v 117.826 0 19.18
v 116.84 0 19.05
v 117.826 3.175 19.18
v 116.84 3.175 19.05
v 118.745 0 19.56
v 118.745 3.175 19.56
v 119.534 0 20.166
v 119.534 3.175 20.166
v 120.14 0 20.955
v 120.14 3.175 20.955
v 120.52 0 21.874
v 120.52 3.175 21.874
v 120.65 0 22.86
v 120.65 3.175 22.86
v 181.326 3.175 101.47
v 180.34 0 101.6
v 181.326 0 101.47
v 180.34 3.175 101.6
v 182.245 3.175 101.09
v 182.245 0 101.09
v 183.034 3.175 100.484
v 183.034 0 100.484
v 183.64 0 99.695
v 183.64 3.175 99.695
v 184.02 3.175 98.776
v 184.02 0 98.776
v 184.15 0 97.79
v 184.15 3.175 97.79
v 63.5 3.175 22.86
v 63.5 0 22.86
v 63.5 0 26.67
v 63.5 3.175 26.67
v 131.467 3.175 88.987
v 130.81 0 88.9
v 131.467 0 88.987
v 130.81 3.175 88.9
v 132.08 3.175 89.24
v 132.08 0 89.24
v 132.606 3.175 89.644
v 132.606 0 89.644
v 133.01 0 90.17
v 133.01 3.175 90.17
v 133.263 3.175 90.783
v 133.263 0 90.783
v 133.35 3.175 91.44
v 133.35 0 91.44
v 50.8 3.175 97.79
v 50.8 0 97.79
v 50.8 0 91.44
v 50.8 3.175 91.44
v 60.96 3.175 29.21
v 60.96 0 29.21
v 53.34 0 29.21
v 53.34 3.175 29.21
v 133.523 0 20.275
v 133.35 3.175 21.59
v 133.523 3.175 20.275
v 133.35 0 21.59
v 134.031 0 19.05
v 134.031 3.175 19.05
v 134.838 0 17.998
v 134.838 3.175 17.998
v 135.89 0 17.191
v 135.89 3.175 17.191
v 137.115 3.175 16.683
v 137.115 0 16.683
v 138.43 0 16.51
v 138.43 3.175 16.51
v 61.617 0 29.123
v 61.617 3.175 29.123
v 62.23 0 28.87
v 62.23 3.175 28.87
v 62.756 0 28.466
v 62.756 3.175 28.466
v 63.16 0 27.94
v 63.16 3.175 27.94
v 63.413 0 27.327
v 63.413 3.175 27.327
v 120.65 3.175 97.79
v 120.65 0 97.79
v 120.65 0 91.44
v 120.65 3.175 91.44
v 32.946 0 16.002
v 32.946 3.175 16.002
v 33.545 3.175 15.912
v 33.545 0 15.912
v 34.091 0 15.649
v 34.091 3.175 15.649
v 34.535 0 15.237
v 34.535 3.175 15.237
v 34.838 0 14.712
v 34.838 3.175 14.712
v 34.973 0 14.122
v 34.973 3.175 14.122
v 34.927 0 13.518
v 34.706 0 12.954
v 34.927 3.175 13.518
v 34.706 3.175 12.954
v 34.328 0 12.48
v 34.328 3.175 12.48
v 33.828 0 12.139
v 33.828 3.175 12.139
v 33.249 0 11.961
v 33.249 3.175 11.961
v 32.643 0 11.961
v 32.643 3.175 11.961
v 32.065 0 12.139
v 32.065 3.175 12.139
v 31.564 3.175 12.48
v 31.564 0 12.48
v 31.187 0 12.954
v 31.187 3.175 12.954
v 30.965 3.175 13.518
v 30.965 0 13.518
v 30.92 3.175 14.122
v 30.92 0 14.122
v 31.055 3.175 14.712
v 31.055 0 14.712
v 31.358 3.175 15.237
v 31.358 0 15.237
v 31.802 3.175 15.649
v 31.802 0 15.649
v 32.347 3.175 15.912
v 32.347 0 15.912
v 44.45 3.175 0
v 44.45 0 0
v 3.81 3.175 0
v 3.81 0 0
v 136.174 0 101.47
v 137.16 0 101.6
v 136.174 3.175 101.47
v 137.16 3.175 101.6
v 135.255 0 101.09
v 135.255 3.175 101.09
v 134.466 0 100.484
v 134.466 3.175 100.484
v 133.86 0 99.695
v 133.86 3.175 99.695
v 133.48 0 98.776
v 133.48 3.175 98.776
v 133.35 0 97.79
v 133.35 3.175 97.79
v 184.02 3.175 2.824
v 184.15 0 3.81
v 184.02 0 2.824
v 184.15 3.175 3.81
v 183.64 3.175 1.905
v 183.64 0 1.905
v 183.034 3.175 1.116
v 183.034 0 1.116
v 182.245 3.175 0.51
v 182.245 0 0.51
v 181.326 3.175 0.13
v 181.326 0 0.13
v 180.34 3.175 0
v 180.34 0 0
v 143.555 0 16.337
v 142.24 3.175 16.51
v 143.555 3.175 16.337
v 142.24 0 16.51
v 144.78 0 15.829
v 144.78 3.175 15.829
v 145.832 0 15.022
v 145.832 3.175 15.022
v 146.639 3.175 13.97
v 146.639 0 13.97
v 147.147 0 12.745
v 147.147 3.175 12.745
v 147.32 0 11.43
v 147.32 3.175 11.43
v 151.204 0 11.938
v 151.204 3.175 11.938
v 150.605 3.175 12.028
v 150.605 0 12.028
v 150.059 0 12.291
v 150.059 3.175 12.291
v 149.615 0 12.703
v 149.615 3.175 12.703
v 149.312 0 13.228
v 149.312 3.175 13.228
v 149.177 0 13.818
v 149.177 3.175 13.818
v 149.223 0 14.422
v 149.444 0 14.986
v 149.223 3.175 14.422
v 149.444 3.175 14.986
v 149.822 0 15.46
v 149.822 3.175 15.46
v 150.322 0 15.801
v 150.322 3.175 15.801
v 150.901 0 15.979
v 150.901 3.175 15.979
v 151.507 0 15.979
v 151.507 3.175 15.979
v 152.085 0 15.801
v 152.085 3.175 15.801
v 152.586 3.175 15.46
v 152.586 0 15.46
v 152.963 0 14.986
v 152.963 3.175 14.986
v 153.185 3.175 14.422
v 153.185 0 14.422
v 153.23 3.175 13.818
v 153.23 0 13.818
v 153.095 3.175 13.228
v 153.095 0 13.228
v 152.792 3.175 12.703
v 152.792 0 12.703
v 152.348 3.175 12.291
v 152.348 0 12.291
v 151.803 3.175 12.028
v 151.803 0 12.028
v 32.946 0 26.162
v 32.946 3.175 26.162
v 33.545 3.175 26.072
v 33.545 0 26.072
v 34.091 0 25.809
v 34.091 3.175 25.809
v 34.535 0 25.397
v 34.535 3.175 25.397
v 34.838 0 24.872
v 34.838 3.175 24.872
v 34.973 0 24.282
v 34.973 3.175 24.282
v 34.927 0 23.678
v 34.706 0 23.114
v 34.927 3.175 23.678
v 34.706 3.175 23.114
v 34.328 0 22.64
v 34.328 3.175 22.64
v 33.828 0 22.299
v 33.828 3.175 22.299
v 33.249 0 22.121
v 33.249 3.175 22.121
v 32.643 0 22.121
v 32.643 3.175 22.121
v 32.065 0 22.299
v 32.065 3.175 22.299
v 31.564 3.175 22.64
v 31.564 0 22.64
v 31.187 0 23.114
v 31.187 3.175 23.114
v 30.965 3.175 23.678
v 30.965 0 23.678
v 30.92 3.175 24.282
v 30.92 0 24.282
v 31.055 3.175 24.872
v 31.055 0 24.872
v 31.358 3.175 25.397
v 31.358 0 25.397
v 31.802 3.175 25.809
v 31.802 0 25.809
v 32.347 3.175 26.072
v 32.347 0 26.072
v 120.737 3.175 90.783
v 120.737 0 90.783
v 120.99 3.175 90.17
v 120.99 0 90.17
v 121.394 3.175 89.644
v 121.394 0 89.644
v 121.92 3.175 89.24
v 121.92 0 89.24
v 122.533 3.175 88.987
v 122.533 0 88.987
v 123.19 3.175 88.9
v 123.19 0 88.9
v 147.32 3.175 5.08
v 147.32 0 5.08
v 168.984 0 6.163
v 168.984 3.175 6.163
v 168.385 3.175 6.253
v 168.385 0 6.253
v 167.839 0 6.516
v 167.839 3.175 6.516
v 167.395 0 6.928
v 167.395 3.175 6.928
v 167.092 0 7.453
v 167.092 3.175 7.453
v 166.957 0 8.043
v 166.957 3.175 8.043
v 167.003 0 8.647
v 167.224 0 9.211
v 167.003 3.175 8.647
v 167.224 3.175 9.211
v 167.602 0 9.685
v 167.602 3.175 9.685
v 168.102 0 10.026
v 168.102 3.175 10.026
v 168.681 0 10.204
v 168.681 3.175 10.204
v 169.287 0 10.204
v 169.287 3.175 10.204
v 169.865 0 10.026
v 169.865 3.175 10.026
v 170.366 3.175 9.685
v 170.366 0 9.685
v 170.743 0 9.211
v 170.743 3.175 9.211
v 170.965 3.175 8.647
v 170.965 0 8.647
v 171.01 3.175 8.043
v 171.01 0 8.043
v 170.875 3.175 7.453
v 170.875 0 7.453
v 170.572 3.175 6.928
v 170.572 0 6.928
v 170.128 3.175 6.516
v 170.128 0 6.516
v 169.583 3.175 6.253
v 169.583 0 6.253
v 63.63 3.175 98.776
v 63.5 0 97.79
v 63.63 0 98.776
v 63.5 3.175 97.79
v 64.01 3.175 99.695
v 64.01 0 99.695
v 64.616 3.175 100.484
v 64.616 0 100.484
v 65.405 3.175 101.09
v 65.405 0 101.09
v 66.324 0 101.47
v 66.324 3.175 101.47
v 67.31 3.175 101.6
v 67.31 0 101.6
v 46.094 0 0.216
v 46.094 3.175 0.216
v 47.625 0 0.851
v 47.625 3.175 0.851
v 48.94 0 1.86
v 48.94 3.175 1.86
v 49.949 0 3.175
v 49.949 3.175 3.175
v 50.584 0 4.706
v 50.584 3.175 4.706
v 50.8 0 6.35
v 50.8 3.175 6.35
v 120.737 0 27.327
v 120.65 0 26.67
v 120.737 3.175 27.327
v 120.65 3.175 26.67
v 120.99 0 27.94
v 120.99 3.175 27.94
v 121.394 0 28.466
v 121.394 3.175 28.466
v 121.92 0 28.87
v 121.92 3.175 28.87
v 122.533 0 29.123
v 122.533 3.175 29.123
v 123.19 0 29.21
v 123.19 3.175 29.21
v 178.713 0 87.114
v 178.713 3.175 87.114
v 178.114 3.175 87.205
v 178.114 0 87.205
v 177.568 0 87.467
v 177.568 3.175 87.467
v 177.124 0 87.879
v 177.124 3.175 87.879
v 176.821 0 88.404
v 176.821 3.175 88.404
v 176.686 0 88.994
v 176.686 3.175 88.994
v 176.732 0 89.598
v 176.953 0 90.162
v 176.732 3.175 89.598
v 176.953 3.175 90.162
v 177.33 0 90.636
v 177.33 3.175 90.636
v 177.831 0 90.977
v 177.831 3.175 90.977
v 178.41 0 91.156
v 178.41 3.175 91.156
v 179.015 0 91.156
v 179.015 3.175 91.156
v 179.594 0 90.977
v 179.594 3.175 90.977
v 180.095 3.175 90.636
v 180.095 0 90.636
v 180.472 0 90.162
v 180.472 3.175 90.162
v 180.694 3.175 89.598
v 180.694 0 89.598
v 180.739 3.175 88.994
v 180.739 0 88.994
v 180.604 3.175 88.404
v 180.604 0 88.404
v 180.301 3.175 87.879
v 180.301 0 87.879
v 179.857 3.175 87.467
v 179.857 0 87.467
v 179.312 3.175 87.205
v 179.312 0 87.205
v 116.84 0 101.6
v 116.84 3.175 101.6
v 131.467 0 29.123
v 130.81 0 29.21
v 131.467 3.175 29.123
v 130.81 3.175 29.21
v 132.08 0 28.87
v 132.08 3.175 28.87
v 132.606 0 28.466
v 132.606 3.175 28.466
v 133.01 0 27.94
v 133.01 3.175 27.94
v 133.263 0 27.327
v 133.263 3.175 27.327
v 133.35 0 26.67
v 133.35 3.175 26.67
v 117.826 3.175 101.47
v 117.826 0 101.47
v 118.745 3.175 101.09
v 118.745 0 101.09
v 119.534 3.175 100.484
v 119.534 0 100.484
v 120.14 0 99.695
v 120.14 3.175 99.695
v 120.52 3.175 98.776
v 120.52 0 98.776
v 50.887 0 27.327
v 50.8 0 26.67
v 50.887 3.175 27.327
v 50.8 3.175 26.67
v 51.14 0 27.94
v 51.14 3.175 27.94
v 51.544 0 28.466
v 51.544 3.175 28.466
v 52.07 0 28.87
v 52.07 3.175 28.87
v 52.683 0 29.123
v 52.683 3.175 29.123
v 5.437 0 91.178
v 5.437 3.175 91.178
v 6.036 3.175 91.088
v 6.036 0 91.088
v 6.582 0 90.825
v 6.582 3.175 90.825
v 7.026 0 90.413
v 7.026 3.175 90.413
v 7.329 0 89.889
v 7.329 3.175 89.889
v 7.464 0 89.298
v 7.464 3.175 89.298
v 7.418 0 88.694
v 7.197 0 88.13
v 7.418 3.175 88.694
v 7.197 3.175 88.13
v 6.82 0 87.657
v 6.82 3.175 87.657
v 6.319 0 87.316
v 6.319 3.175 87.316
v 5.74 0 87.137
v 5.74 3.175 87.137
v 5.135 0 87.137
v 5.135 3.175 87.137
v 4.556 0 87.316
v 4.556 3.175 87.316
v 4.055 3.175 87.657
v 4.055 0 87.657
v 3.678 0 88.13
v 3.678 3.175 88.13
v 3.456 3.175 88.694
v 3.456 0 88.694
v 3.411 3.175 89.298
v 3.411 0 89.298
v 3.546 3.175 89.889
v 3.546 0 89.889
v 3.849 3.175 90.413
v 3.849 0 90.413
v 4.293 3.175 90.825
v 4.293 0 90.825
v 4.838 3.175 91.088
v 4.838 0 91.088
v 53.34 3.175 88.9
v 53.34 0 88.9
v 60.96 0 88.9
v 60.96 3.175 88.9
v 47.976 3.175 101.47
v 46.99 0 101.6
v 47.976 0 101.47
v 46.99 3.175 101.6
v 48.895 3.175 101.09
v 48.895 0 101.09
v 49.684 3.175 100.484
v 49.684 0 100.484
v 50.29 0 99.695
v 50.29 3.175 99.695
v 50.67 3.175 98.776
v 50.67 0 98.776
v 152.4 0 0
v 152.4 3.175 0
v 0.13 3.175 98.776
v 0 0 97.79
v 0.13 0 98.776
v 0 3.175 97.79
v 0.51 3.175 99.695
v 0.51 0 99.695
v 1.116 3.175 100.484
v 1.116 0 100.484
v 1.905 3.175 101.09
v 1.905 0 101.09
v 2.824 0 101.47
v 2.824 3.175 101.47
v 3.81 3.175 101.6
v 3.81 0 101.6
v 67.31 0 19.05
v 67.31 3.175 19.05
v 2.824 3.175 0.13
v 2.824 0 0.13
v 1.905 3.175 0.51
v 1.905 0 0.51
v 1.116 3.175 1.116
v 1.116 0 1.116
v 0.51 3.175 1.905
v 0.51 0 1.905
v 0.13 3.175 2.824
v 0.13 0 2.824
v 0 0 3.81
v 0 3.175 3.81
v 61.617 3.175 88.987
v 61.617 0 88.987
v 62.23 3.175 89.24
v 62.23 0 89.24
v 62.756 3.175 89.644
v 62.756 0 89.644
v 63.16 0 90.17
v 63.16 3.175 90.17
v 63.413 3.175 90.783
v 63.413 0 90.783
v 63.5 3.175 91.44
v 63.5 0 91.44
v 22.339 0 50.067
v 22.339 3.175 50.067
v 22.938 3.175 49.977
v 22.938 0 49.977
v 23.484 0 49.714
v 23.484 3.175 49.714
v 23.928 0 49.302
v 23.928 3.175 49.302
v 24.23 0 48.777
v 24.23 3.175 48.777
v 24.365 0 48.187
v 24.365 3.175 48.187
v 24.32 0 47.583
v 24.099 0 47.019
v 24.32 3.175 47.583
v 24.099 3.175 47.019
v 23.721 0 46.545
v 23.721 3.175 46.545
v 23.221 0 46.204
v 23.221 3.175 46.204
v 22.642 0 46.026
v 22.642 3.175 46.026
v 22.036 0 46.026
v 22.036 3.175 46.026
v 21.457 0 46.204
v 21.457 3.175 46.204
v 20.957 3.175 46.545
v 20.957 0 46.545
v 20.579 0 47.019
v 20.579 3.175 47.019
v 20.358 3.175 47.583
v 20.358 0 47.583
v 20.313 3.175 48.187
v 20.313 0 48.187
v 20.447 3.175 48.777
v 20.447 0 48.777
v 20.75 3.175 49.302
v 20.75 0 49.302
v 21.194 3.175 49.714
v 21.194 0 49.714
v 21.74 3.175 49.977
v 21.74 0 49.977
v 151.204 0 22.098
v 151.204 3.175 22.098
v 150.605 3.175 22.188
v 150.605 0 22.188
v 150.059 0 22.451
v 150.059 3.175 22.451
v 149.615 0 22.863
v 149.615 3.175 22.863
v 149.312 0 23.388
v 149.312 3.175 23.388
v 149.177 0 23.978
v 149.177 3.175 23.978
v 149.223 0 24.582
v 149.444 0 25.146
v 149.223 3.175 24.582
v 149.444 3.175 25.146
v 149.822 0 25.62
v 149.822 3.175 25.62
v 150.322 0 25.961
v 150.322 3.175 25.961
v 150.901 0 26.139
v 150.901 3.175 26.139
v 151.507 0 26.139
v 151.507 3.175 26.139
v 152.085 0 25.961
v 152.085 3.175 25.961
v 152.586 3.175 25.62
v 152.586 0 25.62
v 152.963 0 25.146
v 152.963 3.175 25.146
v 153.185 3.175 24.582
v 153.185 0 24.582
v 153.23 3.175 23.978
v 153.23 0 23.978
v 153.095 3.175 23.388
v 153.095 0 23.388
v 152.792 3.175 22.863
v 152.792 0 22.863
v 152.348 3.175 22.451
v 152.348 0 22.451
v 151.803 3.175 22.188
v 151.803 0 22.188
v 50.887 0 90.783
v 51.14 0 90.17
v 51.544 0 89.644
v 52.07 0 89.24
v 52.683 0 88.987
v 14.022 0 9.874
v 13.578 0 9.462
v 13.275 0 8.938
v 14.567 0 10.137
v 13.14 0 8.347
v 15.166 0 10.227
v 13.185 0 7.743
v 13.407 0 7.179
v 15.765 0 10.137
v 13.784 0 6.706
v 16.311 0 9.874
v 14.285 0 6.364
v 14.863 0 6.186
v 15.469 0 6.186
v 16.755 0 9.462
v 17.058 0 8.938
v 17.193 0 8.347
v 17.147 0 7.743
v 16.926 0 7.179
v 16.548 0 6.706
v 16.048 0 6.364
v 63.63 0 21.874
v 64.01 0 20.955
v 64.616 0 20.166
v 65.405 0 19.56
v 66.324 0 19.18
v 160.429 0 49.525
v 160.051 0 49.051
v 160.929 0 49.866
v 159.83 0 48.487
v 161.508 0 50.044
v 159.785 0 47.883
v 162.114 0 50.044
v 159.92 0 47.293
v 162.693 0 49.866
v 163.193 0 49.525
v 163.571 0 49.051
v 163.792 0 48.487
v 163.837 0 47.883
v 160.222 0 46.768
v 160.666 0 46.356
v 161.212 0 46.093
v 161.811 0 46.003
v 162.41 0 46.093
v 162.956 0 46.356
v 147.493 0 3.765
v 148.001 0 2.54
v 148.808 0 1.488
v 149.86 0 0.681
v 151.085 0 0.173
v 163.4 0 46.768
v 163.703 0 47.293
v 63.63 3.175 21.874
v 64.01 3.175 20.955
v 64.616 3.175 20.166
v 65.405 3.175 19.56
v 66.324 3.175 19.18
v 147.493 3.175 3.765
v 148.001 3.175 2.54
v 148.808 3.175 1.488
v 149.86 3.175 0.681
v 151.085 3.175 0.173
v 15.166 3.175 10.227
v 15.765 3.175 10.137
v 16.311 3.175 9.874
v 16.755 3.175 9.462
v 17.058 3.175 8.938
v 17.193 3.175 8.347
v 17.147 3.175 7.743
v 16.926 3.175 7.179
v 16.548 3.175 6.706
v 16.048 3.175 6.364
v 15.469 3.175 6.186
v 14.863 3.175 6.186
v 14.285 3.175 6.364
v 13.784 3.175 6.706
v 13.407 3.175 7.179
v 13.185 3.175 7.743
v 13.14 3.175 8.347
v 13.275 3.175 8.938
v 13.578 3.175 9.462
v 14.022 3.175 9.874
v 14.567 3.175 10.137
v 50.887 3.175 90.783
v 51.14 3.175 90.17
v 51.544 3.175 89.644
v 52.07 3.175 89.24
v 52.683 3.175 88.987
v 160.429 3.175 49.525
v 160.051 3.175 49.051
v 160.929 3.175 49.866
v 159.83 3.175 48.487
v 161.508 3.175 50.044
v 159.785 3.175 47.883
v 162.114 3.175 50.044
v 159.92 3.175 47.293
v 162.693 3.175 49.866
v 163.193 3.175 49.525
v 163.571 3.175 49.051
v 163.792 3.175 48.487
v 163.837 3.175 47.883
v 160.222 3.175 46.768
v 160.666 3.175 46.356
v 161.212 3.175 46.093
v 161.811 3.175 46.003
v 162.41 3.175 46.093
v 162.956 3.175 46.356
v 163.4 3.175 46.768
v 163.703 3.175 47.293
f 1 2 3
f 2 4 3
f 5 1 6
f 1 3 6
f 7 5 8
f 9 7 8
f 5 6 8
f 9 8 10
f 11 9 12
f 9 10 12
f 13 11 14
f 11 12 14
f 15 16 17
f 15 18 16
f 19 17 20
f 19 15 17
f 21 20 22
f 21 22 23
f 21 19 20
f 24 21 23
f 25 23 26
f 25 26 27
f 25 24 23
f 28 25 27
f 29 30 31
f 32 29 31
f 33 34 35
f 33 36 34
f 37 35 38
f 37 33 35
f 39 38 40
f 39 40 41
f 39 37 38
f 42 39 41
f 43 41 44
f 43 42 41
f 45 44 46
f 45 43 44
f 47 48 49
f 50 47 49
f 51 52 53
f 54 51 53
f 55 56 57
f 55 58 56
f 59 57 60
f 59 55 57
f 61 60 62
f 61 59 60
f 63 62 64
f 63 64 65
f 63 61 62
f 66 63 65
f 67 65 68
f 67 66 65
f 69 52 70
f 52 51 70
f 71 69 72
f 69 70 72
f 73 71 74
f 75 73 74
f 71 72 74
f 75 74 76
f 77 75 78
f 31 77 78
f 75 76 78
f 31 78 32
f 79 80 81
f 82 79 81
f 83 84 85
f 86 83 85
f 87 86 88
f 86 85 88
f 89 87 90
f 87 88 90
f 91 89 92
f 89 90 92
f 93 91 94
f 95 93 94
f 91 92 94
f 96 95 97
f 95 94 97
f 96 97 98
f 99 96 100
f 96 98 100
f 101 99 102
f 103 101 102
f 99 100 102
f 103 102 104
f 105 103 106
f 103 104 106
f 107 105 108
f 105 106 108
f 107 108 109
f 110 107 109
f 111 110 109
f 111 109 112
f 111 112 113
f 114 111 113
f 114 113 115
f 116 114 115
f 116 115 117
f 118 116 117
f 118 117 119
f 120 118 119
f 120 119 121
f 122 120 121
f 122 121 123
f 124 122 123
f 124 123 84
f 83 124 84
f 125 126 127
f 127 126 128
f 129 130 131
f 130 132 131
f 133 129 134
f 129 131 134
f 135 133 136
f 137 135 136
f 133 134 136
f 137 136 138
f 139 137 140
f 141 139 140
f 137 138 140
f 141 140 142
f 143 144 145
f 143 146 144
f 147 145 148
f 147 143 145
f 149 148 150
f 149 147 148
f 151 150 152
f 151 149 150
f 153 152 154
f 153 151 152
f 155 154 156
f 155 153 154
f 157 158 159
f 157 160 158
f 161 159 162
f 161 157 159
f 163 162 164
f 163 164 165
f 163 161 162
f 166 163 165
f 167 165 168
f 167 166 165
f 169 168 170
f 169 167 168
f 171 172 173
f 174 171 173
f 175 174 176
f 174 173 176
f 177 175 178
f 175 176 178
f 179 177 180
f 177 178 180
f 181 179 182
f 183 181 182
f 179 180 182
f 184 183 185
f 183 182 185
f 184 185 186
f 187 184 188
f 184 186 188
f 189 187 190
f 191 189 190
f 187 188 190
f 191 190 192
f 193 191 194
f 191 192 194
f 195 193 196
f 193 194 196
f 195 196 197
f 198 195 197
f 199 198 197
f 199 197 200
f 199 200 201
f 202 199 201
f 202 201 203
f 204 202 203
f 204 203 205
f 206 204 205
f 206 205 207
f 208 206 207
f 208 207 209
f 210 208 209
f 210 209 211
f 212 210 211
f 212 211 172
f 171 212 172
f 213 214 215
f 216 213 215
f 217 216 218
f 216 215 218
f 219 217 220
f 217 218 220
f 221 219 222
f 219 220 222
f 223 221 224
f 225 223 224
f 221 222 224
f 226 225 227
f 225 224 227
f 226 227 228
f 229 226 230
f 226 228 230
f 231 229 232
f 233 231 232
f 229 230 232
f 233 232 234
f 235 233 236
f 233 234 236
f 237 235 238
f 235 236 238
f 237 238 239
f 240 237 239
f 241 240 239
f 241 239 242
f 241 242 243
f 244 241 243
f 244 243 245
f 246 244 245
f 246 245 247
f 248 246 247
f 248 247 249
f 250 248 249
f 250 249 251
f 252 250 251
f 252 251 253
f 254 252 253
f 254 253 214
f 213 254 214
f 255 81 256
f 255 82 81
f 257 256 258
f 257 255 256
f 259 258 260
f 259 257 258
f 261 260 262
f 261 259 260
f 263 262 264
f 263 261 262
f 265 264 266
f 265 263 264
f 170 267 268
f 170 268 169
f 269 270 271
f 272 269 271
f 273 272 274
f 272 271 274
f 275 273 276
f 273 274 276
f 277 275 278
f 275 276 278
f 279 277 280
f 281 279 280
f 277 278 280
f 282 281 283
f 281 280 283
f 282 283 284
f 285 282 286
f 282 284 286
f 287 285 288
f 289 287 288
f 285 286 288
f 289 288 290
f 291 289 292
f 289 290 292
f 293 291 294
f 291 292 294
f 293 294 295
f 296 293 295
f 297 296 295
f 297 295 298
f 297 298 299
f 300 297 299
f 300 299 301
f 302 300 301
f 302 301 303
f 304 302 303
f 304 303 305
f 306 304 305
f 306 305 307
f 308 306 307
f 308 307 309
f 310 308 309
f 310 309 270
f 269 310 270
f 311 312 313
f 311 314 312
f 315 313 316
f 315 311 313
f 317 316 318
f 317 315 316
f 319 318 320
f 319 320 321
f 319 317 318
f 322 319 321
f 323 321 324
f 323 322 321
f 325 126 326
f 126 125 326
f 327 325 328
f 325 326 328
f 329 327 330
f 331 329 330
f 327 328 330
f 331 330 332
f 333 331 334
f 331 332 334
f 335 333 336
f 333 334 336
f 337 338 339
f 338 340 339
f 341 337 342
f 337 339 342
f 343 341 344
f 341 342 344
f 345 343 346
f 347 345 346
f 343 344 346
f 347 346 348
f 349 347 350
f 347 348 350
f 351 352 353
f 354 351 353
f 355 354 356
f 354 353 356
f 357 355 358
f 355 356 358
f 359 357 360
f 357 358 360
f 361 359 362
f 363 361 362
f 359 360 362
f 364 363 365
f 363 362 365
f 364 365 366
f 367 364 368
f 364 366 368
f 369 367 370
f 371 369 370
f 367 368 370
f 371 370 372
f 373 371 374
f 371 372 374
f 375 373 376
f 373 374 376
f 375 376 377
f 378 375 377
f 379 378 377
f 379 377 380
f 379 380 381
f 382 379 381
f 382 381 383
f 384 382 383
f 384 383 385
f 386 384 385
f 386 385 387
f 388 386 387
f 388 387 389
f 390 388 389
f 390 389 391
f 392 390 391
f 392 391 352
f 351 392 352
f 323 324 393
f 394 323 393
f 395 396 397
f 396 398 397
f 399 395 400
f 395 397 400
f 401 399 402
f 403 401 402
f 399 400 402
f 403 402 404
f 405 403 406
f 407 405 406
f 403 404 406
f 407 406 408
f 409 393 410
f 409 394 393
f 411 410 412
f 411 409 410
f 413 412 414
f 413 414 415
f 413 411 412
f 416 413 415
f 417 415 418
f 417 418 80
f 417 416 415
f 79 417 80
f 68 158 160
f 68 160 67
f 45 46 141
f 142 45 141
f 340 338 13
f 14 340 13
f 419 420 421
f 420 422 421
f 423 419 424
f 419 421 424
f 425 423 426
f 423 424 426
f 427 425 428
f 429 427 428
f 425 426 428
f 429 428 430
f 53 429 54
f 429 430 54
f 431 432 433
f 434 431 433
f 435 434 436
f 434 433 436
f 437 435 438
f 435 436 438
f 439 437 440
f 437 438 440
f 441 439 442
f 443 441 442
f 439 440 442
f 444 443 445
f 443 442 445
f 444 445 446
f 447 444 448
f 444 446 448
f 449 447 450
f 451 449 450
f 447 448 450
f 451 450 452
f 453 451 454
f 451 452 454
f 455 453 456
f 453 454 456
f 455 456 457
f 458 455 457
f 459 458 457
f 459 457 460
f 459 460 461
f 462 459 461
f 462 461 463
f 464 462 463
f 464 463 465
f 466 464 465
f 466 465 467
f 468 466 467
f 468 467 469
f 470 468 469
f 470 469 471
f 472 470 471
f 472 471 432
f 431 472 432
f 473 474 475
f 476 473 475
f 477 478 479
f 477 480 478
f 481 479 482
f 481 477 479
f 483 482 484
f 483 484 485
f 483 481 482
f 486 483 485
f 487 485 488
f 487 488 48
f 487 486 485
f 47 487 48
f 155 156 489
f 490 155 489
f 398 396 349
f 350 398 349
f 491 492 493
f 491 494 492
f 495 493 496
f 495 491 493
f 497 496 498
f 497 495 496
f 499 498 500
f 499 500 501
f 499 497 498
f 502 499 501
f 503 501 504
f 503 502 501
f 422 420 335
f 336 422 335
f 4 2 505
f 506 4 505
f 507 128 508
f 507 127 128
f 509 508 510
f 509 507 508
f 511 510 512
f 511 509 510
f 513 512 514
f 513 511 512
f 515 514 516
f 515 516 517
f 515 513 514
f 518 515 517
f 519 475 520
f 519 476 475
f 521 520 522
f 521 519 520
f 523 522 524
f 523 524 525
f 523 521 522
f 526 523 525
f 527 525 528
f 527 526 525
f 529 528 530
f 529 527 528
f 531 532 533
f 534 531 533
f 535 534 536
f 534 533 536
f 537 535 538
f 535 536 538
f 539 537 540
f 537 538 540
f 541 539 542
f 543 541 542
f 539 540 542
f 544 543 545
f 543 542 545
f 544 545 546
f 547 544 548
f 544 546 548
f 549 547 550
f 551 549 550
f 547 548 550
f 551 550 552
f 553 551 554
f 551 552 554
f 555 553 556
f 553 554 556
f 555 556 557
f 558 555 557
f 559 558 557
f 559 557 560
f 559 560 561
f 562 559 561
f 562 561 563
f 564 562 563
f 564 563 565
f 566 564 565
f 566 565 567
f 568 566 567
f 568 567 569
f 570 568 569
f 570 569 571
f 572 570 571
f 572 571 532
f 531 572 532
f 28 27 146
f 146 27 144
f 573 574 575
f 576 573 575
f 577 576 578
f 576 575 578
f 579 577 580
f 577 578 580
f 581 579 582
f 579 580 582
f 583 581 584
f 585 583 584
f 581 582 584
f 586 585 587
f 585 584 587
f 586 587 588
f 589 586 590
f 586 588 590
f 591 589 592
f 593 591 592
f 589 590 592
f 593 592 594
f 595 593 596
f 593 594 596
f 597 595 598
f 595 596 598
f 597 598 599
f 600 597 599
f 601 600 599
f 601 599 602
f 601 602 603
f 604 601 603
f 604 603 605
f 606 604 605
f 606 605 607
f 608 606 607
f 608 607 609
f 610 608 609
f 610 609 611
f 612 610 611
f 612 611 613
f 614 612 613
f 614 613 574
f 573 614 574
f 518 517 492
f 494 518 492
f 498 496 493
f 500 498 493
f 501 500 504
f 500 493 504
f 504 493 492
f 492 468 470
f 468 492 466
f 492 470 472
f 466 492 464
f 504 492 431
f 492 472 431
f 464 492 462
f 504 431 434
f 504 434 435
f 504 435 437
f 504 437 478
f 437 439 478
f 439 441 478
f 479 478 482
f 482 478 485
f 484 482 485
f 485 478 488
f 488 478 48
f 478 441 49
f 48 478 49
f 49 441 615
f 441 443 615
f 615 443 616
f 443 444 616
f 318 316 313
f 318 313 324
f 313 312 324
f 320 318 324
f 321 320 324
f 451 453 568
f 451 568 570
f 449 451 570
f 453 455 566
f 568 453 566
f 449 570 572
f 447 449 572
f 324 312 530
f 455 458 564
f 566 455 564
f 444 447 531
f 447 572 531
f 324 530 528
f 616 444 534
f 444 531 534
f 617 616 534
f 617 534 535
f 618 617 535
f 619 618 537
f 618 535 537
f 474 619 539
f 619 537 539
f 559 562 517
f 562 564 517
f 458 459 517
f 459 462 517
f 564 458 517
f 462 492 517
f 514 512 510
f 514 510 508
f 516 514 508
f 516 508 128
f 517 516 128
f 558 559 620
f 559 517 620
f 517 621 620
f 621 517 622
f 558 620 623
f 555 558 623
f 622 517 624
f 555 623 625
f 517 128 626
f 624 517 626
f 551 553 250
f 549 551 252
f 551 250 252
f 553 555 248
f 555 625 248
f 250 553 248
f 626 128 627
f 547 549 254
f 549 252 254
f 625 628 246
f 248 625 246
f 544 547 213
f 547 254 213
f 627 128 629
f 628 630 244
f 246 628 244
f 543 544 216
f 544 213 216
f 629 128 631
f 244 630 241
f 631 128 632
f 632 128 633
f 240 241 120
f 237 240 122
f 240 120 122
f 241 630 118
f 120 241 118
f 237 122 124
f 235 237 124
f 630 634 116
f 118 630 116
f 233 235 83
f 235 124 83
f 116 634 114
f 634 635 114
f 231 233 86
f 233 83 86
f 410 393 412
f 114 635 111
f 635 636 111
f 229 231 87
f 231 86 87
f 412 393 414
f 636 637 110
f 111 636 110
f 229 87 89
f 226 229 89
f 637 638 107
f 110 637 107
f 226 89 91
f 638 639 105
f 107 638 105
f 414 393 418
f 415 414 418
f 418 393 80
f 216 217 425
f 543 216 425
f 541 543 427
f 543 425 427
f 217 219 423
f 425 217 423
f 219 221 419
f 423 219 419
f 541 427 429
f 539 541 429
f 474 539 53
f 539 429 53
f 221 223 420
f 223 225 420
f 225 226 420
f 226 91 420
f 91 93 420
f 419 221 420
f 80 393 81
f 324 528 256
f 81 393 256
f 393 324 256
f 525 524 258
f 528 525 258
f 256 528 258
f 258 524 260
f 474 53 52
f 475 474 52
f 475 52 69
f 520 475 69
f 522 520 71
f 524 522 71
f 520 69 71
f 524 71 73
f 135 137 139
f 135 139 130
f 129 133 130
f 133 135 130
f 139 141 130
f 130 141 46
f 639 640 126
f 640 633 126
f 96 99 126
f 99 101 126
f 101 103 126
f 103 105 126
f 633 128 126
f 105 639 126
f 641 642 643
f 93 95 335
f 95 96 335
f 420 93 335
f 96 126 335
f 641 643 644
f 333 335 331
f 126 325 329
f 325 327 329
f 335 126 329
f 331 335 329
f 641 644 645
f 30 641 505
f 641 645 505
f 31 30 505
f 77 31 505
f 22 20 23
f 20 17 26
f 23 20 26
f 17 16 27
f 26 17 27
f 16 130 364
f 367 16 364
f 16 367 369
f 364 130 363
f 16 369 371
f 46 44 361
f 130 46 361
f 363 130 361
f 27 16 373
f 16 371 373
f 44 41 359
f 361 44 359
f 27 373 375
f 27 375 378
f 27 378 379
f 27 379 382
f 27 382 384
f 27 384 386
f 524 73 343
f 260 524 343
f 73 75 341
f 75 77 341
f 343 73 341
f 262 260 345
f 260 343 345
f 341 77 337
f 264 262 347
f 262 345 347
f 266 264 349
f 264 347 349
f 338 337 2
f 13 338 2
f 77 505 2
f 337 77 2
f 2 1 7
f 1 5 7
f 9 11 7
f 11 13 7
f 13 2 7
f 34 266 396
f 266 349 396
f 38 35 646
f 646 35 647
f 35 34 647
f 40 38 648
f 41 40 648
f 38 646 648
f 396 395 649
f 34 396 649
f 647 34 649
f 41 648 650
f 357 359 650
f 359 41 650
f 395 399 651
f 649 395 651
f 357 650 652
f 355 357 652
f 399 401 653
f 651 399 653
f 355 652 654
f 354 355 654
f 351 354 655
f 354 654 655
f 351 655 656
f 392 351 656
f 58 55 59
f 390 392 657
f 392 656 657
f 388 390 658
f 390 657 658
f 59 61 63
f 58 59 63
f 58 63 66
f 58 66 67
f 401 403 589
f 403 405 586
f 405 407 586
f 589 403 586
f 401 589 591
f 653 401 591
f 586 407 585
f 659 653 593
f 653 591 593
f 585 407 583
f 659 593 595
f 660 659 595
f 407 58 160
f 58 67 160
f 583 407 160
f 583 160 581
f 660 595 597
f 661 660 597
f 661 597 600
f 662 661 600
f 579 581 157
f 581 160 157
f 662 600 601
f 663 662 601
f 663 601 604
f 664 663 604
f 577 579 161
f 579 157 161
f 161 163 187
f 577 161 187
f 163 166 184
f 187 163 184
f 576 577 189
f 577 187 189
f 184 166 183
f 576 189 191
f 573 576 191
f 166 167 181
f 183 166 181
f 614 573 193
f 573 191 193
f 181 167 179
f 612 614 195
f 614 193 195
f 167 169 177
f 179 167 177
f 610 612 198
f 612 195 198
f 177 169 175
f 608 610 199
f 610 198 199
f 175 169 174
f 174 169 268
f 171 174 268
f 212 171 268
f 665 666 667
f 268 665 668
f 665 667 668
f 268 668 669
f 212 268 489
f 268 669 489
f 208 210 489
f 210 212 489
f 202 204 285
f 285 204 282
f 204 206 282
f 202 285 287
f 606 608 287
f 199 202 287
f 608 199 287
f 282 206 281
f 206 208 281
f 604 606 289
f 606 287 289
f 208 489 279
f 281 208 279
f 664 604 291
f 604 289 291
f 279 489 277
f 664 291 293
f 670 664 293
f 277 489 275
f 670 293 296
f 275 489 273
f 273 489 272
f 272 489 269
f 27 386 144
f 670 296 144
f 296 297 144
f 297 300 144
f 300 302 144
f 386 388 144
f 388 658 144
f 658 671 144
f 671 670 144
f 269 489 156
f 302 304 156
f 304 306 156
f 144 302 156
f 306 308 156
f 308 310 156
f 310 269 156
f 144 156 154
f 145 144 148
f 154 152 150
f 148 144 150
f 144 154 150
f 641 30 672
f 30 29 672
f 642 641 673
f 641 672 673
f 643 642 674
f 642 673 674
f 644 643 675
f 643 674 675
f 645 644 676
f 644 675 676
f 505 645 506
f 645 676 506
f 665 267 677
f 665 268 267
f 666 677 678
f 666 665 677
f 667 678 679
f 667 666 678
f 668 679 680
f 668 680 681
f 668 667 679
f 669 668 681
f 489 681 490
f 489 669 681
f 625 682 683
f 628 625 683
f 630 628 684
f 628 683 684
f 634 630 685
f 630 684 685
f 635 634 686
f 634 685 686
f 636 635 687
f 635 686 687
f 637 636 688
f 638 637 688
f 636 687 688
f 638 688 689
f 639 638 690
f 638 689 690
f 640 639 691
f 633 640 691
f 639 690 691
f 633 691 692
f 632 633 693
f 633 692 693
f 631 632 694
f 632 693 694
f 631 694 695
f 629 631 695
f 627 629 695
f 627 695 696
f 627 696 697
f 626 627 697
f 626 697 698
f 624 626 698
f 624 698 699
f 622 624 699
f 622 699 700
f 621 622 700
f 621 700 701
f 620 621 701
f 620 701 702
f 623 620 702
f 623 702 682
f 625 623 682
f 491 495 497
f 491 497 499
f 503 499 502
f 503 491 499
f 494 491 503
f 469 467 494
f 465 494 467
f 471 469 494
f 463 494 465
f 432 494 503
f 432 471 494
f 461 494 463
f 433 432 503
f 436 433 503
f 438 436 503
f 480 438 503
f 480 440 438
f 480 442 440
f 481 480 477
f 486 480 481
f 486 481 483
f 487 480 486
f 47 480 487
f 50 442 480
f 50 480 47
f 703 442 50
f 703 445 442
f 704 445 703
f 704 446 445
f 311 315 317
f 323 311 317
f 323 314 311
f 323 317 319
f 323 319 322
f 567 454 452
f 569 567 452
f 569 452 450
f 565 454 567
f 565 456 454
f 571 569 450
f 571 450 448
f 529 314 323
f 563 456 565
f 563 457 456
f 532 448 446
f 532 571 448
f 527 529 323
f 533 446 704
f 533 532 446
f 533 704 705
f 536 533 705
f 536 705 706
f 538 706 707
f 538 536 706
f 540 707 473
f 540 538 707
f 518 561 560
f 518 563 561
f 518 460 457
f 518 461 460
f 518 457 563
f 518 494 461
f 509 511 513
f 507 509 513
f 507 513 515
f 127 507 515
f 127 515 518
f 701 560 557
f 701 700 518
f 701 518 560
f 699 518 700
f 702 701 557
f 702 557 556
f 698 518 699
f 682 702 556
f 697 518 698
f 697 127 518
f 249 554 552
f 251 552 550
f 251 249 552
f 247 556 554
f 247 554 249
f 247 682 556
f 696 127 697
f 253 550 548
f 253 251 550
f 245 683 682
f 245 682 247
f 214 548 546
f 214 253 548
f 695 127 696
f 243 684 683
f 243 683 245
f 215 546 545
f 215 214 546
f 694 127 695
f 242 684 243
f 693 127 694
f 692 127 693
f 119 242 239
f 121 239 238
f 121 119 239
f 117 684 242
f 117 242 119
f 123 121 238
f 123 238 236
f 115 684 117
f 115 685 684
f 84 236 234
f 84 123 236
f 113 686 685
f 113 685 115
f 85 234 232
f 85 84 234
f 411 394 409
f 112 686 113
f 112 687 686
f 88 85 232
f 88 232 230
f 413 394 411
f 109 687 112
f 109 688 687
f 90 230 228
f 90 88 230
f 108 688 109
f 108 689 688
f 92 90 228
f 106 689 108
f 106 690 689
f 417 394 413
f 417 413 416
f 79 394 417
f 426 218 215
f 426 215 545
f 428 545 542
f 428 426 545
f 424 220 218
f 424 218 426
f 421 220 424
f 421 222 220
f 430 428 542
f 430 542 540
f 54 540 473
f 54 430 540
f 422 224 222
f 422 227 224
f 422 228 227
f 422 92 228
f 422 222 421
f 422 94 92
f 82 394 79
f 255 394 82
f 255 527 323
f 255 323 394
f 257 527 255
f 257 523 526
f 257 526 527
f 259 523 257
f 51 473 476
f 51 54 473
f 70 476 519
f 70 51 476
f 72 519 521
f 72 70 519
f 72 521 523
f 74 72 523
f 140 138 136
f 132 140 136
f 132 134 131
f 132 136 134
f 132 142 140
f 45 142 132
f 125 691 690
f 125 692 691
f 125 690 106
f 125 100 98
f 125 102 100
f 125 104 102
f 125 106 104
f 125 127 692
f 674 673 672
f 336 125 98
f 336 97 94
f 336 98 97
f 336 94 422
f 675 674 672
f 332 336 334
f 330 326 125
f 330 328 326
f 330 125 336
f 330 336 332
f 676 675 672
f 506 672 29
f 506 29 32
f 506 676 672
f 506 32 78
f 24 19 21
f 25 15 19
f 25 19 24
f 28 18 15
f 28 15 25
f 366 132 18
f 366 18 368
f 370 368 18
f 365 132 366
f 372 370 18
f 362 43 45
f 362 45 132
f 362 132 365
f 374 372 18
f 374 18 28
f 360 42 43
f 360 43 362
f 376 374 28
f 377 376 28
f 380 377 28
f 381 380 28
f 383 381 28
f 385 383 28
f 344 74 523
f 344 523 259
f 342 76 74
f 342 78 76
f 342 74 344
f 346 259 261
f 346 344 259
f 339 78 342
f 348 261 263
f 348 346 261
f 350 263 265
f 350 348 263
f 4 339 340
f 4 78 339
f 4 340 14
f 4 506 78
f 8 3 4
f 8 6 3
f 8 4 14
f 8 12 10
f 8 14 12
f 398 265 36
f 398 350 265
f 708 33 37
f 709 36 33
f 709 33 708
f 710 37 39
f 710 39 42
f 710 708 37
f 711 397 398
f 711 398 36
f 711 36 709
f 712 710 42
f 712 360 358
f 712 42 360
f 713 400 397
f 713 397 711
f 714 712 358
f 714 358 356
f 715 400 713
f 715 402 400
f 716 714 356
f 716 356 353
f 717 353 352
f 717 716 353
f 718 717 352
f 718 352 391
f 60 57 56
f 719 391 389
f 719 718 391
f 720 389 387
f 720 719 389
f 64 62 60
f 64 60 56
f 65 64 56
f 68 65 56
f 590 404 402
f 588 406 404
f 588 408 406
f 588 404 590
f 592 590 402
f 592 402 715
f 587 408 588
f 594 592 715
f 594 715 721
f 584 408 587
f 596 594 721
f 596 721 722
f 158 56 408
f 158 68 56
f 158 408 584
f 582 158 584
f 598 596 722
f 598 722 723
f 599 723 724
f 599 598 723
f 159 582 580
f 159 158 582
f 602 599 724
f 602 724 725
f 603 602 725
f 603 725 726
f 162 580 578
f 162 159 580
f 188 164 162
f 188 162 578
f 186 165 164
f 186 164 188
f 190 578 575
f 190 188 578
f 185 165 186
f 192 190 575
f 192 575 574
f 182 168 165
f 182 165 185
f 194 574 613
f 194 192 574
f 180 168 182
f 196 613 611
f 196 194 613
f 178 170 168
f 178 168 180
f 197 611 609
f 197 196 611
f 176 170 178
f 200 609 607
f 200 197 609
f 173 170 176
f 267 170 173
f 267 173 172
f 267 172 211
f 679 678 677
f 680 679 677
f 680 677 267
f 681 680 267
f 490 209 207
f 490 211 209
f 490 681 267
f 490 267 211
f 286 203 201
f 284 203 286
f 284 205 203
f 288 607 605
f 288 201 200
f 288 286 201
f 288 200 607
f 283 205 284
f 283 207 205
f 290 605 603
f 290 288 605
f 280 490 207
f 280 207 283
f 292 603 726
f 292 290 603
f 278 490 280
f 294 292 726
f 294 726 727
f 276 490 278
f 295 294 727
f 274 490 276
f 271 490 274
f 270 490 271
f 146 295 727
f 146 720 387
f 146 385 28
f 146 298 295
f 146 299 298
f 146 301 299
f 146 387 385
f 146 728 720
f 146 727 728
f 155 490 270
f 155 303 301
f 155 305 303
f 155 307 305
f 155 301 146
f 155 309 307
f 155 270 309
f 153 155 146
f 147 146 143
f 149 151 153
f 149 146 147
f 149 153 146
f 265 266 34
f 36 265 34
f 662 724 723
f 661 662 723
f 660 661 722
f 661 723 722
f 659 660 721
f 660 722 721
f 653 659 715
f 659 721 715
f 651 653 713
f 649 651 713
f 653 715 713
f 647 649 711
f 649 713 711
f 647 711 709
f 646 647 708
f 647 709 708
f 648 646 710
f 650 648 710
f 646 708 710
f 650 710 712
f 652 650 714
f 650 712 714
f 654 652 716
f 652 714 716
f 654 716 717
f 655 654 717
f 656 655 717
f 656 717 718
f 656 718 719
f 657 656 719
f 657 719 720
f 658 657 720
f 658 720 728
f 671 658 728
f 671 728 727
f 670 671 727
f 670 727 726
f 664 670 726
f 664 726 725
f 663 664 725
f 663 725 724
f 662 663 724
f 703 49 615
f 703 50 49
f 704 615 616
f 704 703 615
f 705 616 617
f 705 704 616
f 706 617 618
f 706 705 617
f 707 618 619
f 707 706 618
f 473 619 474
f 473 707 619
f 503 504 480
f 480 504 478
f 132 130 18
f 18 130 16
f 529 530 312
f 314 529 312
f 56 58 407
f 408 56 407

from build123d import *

# Parameters (mm, degrees)
BOSS_EXTRUDE1_DEPTH     = 3.175
FILLET1_R               = 3.81
SKETCH2_R               = 2.032
CUT_EXTRUDE1_DEPTH      = 211.342252353
FILLET2_R               = 6.35
FILLET3_R               = 2.54
FILLET4_R               = 3.81
FILLET5_R               = 3.81
CUT_EXTRUDE2_DEPTH      = 211.342252353
CUT_EXTRUDE2_DEPTH_BACK = 211.342252353
FILLET6_R               = 5.08


with BuildPart() as part:
    # Sketch1 → Boss-Extrude1 (new body)
    with BuildSketch(Plane(origin=(0, 0, 0), x_dir=(1, 0, 0), z_dir=(0, 1, 0))):
        Polygon((50.8, 0), (0, 0), (0, -101.6), (50.8, -101.6), (50.8, -88.9), (63.5, -88.9), (63.5, -101.6), (120.65, -101.6), (120.65, -88.9), (133.35, -88.9), (133.35, -101.6), (184.15, -101.6), (184.15, 0), (133.35, 0), (133.35, -29.21), (120.65, -29.21), (120.65, -19.05), (63.5, -19.05), (63.5, -29.21), (50.8, -29.21), align=None)
    extrude(amount=BOSS_EXTRUDE1_DEPTH)

    # Fillet1
    fillet1_edges = [part.edges().sort_by_distance(p)[0] for p in [
        (184.15, 1.5875, 101.6),
        (0, 1.5875, 101.6),
        (184.15, 1.5875, 0),
        (0, 1.5875, 0),
    ]]
    fillet(fillet1_edges, radius=FILLET1_R)

    # Sketch2 → Cut-Extrude1 (cut, through all)
    with BuildSketch(Plane(origin=(0, 3.175, 0), x_dir=(1, 0, 0), z_dir=(0, 1, 0))):
        with Locations((5.437401114, -89.146320086)):
            Circle(SKETCH2_R)
        with Locations((178.712598886, -89.146320086)):
            Circle(SKETCH2_R)
        with Locations((22.338907609, -48.03498858)):
            Circle(SKETCH2_R)
        with Locations((15.16630044, -8.195189781)):
            Circle(SKETCH2_R)
        with Locations((32.94630044, -24.13)):
            Circle(SKETCH2_R)
        with Locations((32.94630044, -13.97)):
            Circle(SKETCH2_R)
        with Locations((161.811092391, -48.03498858)):
            Circle(SKETCH2_R)
        with Locations((151.20369956, -24.13)):
            Circle(SKETCH2_R)
        with Locations((151.20369956, -13.97)):
            Circle(SKETCH2_R)
        with Locations((168.98369956, -8.195189781)):
            Circle(SKETCH2_R)
    extrude(amount=-CUT_EXTRUDE1_DEPTH, mode=Mode.SUBTRACT)

    # Fillet2
    fillet2_edges = [part.edges().sort_by_distance(p)[0] for p in [
        (50.8, 1.5875, 0),
        (133.35, 1.5875, 0),
    ]]
    fillet(fillet2_edges, radius=FILLET2_R)

    # Fillet3
    fillet3_edges = [part.edges().sort_by_distance(p)[0] for p in [
        (133.35, 1.5875, 29.21),
        (120.65, 1.5875, 29.21),
        (50.8, 1.5875, 29.21),
        (63.5, 1.5875, 29.21),
        (133.35, 1.5875, 88.9),
        (120.65, 1.5875, 88.9),
        (63.5, 1.5875, 88.9),
        (50.8, 1.5875, 88.9),
    ]]
    fillet(fillet3_edges, radius=FILLET3_R)

    # Fillet4
    fillet4_edges = [part.edges().sort_by_distance(p)[0] for p in [
        (120.65, 1.5875, 19.05),
        (63.5, 1.5875, 19.05),
    ]]
    fillet(fillet4_edges, radius=FILLET4_R)

    # Fillet5
    fillet5_edges = [part.edges().sort_by_distance(p)[0] for p in [
        (133.35, 1.5875, 101.6),
        (120.65, 1.5875, 101.6),
        (63.5, 1.5875, 101.6),
        (50.8, 1.5875, 101.6),
    ]]
    fillet(fillet5_edges, radius=FILLET5_R)

    # Sketch9 → Cut-Extrude2 (cut, two sides: drawn at the far end of the back side and taken through both)
    with BuildSketch(Plane.XZ.offset(-CUT_EXTRUDE2_DEPTH_BACK)):
        with BuildLine():
            Line((147.32, 16.51), (133.35, 16.51))
            Line((133.35, 16.51), (133.35, 6.35))
            ThreePointArc((133.35, 6.35), (135.209871939, 1.859871939), (139.7, 0))
            Line((139.7, 0), (147.32, 0))
            Line((147.32, 0), (147.32, 16.51))
        make_face()
    extrude(amount=CUT_EXTRUDE2_DEPTH + CUT_EXTRUDE2_DEPTH_BACK, mode=Mode.SUBTRACT)

    # Fillet6
    fillet6_edges = [part.edges().sort_by_distance(p)[0] for p in [
        (147.32, 1.5875, 0),
        (147.32, 1.5875, 16.51),
        (133.35, 1.5875, 16.51),
    ]]
    fillet(fillet6_edges, radius=FILLET6_R)


solid = part.part
